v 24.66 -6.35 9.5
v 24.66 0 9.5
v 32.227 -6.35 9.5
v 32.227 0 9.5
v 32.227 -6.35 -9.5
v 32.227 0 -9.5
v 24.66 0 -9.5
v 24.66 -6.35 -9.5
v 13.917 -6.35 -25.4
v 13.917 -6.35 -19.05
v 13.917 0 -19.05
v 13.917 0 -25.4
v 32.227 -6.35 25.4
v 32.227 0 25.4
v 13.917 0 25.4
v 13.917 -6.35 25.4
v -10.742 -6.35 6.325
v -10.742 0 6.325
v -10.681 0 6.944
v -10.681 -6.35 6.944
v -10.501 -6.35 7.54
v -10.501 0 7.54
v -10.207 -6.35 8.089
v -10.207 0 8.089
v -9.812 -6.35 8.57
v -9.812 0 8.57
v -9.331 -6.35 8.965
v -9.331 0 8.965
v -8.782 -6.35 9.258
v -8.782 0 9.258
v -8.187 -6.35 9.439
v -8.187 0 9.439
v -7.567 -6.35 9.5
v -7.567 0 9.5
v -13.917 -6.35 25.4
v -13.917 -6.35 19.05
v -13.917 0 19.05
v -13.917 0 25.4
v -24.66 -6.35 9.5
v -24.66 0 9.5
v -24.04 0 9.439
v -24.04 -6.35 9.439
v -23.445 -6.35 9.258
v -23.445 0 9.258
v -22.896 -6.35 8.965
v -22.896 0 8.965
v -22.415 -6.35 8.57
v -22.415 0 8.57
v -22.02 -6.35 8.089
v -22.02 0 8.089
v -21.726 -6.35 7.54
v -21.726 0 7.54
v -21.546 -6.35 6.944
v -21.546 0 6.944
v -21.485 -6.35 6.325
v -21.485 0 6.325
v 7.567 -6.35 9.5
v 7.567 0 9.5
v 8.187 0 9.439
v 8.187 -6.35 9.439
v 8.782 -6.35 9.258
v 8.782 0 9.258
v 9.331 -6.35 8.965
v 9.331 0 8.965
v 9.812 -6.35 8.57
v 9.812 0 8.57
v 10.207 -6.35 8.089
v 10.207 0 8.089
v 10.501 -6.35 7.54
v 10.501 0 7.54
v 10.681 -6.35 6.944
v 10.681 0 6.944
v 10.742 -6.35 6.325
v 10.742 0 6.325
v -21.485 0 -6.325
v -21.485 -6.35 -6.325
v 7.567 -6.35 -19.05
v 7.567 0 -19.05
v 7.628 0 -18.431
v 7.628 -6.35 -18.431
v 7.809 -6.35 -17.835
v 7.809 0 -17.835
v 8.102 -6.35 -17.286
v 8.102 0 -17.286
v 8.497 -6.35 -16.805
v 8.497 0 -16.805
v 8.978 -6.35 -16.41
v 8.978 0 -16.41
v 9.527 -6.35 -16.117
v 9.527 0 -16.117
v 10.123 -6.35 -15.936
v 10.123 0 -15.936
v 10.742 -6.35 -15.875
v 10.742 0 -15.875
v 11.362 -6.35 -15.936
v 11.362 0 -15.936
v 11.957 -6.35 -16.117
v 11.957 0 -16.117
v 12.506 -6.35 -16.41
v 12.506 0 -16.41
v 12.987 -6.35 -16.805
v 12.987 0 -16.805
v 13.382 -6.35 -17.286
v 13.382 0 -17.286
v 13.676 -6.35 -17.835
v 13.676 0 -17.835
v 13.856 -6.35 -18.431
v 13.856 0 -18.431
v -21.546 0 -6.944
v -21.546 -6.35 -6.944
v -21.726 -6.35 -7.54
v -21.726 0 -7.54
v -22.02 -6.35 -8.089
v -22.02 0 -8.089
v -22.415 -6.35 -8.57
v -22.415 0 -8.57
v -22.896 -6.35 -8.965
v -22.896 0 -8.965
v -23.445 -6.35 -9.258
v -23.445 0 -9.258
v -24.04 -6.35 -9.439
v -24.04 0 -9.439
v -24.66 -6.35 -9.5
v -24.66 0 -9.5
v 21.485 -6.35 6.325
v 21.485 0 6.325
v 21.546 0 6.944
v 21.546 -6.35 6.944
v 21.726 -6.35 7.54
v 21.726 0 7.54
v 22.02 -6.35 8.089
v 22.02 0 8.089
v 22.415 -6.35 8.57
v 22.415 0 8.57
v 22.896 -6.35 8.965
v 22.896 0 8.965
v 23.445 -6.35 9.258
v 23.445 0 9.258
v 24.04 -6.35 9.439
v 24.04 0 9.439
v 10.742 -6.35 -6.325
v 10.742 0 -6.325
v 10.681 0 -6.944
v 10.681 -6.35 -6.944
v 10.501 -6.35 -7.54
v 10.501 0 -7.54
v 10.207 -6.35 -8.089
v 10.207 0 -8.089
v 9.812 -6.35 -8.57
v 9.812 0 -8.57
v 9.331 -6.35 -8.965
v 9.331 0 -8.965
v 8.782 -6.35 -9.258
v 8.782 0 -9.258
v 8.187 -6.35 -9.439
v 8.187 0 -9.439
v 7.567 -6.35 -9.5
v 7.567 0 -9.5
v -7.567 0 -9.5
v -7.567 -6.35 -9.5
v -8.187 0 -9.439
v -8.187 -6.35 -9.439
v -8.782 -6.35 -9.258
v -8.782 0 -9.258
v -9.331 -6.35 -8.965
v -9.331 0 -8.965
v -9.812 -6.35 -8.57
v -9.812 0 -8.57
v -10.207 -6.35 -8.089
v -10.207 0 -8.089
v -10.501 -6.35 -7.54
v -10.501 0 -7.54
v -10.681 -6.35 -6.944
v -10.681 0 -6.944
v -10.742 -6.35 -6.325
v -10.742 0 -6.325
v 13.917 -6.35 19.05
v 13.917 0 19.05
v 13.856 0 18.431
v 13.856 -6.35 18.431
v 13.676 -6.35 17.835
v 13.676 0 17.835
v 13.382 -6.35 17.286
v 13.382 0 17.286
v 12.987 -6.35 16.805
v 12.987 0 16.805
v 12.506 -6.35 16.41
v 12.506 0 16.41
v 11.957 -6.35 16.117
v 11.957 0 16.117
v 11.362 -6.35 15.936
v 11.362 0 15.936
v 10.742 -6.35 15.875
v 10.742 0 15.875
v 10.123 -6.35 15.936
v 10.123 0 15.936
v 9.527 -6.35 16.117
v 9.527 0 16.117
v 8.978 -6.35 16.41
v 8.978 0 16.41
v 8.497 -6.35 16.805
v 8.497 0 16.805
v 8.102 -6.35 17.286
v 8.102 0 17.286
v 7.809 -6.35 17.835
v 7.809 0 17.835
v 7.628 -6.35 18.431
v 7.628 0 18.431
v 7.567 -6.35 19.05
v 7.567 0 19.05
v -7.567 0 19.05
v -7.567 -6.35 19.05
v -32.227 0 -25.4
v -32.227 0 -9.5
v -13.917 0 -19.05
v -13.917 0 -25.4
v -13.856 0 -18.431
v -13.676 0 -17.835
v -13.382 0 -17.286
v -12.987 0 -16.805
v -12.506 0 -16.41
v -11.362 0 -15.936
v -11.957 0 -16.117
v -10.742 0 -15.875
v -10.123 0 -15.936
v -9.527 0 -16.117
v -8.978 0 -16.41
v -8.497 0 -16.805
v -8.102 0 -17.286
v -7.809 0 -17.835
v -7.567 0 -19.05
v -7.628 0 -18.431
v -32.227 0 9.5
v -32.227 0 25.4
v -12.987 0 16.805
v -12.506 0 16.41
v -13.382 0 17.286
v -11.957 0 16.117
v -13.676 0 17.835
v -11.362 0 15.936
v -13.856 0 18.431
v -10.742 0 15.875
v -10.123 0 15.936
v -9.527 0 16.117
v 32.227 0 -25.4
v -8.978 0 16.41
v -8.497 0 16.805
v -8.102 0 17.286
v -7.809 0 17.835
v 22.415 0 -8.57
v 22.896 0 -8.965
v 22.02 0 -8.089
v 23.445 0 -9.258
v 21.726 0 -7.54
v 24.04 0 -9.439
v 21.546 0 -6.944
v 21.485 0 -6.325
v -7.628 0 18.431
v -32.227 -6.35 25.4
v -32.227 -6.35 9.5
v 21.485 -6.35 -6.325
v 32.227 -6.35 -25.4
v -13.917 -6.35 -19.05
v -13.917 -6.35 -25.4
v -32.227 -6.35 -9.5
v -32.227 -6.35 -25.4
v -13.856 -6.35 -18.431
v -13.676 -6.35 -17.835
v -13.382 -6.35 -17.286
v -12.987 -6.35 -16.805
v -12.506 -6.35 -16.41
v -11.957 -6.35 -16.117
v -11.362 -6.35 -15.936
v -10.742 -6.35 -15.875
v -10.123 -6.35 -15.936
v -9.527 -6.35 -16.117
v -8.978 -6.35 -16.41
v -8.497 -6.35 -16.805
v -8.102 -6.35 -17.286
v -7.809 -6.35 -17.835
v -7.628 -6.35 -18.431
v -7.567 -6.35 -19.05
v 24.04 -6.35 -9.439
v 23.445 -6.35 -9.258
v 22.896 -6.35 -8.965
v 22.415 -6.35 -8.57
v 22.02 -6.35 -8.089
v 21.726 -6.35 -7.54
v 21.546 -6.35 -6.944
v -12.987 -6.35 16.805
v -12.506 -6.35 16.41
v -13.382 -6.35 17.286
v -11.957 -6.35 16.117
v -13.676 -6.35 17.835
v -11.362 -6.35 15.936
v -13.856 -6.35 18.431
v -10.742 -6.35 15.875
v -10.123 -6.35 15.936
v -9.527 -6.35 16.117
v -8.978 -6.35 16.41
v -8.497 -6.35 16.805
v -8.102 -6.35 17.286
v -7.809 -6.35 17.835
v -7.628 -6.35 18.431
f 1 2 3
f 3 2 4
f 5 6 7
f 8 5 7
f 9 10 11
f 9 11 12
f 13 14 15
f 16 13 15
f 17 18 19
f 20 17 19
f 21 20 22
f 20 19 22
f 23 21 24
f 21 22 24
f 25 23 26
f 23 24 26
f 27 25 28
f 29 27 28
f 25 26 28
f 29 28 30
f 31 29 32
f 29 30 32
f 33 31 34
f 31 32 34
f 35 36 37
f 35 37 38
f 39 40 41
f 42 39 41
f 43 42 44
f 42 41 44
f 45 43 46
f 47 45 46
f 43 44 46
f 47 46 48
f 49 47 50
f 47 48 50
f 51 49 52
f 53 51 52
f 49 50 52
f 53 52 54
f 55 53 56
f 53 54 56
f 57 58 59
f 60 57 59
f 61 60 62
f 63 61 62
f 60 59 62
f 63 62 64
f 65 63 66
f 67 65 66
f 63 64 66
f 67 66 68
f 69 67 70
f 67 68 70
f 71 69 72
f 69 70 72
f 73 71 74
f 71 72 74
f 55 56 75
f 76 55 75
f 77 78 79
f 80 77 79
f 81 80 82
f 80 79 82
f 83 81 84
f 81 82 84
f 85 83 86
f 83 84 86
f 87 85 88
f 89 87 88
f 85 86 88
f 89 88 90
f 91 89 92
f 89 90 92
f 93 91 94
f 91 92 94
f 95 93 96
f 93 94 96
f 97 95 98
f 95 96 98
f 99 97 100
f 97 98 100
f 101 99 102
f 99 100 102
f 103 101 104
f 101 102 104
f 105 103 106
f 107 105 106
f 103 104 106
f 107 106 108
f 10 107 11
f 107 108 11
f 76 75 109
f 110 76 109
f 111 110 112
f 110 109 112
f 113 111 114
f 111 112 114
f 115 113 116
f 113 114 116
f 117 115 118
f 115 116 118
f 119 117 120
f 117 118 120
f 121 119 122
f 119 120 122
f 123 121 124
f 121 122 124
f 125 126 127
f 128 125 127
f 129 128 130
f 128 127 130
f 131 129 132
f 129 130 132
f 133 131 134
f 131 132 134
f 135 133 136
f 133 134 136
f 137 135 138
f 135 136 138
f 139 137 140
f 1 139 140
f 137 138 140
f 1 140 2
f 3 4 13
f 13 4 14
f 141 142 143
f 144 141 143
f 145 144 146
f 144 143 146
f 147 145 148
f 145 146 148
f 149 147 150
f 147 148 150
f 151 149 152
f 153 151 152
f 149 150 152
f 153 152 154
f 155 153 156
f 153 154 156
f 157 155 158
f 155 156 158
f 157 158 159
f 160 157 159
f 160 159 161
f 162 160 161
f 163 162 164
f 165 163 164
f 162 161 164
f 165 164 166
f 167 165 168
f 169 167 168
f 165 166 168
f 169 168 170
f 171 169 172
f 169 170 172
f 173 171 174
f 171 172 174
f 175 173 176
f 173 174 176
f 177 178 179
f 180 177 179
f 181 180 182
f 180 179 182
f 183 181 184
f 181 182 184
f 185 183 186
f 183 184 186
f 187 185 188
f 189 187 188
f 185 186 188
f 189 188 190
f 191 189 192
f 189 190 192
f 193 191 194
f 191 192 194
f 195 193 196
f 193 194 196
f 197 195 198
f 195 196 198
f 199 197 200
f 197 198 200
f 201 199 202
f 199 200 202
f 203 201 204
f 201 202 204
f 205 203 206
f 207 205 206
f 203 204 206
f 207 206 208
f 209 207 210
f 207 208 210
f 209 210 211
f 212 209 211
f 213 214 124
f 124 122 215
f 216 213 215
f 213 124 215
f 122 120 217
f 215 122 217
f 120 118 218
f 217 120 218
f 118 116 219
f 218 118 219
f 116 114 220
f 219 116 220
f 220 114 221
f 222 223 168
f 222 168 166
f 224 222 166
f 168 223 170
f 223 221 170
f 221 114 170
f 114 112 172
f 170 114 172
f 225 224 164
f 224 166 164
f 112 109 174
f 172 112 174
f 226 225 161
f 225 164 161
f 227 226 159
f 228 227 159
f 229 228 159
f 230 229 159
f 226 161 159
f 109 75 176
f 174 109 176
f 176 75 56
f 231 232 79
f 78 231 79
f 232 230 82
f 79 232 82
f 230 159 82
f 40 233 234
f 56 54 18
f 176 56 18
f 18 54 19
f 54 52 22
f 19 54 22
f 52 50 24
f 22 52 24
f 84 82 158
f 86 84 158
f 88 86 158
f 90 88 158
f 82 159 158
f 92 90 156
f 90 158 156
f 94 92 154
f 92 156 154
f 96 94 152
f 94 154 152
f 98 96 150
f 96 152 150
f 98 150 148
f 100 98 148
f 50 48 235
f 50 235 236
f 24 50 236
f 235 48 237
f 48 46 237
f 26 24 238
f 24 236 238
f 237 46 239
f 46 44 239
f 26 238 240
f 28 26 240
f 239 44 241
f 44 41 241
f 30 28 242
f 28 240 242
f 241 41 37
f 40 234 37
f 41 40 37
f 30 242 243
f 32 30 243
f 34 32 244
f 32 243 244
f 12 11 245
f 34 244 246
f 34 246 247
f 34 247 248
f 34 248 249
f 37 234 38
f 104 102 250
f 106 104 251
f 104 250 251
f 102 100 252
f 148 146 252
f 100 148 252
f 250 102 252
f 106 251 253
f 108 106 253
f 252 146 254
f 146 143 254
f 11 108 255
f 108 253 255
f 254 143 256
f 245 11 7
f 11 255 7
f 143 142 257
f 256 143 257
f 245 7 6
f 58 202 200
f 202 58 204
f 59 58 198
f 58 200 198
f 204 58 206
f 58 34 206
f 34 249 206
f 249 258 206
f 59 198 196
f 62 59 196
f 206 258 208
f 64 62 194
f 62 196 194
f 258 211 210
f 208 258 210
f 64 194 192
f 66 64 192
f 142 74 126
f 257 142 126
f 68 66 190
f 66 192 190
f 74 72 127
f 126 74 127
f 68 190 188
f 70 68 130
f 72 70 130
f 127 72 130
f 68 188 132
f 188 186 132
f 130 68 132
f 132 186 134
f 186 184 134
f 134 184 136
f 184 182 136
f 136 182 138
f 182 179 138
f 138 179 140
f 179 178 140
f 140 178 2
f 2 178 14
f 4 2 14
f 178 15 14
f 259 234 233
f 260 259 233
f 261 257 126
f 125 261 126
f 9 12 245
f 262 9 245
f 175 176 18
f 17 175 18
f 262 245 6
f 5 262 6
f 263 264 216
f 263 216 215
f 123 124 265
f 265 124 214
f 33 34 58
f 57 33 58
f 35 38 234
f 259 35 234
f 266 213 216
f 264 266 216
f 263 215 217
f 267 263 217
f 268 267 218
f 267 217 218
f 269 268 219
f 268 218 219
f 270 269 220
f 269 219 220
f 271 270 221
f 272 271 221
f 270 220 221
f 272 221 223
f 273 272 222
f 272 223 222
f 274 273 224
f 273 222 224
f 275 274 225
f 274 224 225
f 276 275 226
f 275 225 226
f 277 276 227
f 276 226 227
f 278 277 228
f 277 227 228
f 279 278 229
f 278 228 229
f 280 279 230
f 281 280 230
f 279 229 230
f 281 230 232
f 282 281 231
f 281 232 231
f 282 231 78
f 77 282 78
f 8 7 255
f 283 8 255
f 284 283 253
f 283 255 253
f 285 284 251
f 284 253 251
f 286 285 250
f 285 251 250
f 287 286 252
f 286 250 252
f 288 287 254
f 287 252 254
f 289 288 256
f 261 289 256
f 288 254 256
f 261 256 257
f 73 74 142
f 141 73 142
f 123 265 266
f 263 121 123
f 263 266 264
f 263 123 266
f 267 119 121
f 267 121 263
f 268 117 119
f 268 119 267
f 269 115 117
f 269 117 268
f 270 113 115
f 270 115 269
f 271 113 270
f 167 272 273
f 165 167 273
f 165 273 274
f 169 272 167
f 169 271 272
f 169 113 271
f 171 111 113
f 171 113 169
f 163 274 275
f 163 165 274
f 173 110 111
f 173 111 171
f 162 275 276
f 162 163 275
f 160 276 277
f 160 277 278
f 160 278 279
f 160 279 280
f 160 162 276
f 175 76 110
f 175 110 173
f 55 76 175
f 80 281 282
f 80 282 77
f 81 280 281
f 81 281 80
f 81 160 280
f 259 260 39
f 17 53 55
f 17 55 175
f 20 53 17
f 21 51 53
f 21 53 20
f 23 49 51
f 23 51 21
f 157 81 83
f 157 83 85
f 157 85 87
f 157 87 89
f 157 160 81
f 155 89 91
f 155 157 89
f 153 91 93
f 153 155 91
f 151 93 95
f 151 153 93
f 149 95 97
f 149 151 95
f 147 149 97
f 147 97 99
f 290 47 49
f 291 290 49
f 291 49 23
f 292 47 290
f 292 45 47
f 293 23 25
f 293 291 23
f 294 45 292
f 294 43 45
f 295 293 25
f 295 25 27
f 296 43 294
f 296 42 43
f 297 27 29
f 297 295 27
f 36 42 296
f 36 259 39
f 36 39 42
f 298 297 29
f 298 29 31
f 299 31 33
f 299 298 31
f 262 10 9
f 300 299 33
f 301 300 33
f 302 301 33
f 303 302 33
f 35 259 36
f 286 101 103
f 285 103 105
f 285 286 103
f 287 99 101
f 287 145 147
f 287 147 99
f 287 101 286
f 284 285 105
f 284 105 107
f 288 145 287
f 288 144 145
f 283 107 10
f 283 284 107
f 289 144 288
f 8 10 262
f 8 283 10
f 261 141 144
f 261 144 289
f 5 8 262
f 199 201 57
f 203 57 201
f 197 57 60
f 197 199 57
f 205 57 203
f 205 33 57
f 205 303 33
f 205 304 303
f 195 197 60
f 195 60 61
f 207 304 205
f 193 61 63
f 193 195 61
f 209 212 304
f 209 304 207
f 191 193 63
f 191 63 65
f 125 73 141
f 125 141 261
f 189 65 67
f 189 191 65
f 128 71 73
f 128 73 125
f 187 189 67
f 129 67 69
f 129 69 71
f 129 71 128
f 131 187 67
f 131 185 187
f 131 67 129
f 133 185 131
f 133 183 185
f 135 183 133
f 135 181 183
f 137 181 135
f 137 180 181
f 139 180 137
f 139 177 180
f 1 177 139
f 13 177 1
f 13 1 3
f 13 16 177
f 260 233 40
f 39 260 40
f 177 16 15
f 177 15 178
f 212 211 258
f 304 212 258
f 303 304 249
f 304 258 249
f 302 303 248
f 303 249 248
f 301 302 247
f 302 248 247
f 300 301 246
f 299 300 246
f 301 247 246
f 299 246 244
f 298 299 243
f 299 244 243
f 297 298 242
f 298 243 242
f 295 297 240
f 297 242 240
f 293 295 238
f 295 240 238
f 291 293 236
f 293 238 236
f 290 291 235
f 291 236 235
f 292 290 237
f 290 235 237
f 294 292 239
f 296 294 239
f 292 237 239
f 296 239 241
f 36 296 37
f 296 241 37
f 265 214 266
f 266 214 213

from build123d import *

# Parameters (mm, degrees)
F1_DEPTH = 6.35


with BuildPart() as f1:
    # F0 (on Front) → F1 (new body)
    with BuildSketch(Plane.XZ):
        with BuildLine():
            Line((-13.917371, -25.4), (-13.917371, -19.05))
            ThreePointArc((-13.917371, -19.05), (-10.742371, -15.875), (-7.567371, -19.05))
            Line((-7.567371, -19.05), (7.567371, -19.05))
            ThreePointArc((7.567371, -19.05), (10.742371, -15.875), (13.917371, -19.05))
            Line((13.917371, -19.05), (13.917371, -25.4))
            Line((13.917371, -25.4), (32.227114, -25.4))
            Line((32.227114, -25.4), (32.227114, -9.4996))
            Line((32.227114, -9.4996), (24.659743, -9.4996))
            ThreePointArc((24.659743, -9.4996), (22.414679, -8.569664), (21.484743, -6.3246))
            Line((21.484743, -6.3246), (21.484743, 6.3246))
            ThreePointArc((21.484743, 6.3246), (22.414679, 8.569664), (24.659743, 9.4996))
            Line((24.659743, 9.4996), (32.227114, 9.4996))
            Line((32.227114, 9.4996), (32.227114, 25.4))
            Line((32.227114, 25.4), (13.917371, 25.4))
            Line((13.917371, 25.4), (13.917371, 19.05))
            ThreePointArc((13.917371, 19.05), (10.742371, 15.875), (7.567371, 19.05))
            Line((7.567371, 19.05), (-7.567371, 19.05))
            ThreePointArc((-7.567371, 19.05), (-10.742371, 15.875), (-13.917371, 19.05))
            Line((-13.917371, 19.05), (-13.917371, 25.4))
            Line((-13.917371, 25.4), (-32.227113, 25.4))
            Line((-32.227113, 25.4), (-32.227113, 9.4996))
            Line((-32.227113, 9.4996), (-24.659742, 9.4996))
            ThreePointArc((-24.659742, 9.4996), (-22.414678, 8.569664), (-21.484742, 6.3246))
            Line((-21.484742, 6.3246), (-21.484742, -6.3246))
            ThreePointArc((-21.484742, -6.3246), (-22.414678, -8.569664), (-24.659742, -9.4996))
            Line((-24.659742, -9.4996), (-32.227113, -9.4996))
            Line((-32.227113, -9.4996), (-32.227113, -25.4))
            Line((-32.227113, -25.4), (-13.917371, -25.4))
        make_face()
        with BuildLine():
            Line((-7.567371, 9.4996), (7.567371, 9.4996))
            ThreePointArc((7.567371, 9.4996), (9.812435, 8.569664), (10.742371, 6.3246))
            Line((10.742371, 6.3246), (10.742371, -6.3246))
            ThreePointArc((10.742371, -6.3246), (9.812435, -8.569664), (7.567371, -9.4996))
            Line((7.567371, -9.4996), (-7.567371, -9.4996))
            ThreePointArc((-7.567371, -9.4996), (-9.812435, -8.569664), (-10.742371, -6.3246))
            Line((-10.742371, -6.3246), (-10.742371, 6.3246))
            ThreePointArc((-10.742371, 6.3246), (-9.812435, 8.569664), (-7.567371, 9.4996))
        make_face(mode=Mode.SUBTRACT)
    extrude(amount=F1_DEPTH)


solid = f1.part
